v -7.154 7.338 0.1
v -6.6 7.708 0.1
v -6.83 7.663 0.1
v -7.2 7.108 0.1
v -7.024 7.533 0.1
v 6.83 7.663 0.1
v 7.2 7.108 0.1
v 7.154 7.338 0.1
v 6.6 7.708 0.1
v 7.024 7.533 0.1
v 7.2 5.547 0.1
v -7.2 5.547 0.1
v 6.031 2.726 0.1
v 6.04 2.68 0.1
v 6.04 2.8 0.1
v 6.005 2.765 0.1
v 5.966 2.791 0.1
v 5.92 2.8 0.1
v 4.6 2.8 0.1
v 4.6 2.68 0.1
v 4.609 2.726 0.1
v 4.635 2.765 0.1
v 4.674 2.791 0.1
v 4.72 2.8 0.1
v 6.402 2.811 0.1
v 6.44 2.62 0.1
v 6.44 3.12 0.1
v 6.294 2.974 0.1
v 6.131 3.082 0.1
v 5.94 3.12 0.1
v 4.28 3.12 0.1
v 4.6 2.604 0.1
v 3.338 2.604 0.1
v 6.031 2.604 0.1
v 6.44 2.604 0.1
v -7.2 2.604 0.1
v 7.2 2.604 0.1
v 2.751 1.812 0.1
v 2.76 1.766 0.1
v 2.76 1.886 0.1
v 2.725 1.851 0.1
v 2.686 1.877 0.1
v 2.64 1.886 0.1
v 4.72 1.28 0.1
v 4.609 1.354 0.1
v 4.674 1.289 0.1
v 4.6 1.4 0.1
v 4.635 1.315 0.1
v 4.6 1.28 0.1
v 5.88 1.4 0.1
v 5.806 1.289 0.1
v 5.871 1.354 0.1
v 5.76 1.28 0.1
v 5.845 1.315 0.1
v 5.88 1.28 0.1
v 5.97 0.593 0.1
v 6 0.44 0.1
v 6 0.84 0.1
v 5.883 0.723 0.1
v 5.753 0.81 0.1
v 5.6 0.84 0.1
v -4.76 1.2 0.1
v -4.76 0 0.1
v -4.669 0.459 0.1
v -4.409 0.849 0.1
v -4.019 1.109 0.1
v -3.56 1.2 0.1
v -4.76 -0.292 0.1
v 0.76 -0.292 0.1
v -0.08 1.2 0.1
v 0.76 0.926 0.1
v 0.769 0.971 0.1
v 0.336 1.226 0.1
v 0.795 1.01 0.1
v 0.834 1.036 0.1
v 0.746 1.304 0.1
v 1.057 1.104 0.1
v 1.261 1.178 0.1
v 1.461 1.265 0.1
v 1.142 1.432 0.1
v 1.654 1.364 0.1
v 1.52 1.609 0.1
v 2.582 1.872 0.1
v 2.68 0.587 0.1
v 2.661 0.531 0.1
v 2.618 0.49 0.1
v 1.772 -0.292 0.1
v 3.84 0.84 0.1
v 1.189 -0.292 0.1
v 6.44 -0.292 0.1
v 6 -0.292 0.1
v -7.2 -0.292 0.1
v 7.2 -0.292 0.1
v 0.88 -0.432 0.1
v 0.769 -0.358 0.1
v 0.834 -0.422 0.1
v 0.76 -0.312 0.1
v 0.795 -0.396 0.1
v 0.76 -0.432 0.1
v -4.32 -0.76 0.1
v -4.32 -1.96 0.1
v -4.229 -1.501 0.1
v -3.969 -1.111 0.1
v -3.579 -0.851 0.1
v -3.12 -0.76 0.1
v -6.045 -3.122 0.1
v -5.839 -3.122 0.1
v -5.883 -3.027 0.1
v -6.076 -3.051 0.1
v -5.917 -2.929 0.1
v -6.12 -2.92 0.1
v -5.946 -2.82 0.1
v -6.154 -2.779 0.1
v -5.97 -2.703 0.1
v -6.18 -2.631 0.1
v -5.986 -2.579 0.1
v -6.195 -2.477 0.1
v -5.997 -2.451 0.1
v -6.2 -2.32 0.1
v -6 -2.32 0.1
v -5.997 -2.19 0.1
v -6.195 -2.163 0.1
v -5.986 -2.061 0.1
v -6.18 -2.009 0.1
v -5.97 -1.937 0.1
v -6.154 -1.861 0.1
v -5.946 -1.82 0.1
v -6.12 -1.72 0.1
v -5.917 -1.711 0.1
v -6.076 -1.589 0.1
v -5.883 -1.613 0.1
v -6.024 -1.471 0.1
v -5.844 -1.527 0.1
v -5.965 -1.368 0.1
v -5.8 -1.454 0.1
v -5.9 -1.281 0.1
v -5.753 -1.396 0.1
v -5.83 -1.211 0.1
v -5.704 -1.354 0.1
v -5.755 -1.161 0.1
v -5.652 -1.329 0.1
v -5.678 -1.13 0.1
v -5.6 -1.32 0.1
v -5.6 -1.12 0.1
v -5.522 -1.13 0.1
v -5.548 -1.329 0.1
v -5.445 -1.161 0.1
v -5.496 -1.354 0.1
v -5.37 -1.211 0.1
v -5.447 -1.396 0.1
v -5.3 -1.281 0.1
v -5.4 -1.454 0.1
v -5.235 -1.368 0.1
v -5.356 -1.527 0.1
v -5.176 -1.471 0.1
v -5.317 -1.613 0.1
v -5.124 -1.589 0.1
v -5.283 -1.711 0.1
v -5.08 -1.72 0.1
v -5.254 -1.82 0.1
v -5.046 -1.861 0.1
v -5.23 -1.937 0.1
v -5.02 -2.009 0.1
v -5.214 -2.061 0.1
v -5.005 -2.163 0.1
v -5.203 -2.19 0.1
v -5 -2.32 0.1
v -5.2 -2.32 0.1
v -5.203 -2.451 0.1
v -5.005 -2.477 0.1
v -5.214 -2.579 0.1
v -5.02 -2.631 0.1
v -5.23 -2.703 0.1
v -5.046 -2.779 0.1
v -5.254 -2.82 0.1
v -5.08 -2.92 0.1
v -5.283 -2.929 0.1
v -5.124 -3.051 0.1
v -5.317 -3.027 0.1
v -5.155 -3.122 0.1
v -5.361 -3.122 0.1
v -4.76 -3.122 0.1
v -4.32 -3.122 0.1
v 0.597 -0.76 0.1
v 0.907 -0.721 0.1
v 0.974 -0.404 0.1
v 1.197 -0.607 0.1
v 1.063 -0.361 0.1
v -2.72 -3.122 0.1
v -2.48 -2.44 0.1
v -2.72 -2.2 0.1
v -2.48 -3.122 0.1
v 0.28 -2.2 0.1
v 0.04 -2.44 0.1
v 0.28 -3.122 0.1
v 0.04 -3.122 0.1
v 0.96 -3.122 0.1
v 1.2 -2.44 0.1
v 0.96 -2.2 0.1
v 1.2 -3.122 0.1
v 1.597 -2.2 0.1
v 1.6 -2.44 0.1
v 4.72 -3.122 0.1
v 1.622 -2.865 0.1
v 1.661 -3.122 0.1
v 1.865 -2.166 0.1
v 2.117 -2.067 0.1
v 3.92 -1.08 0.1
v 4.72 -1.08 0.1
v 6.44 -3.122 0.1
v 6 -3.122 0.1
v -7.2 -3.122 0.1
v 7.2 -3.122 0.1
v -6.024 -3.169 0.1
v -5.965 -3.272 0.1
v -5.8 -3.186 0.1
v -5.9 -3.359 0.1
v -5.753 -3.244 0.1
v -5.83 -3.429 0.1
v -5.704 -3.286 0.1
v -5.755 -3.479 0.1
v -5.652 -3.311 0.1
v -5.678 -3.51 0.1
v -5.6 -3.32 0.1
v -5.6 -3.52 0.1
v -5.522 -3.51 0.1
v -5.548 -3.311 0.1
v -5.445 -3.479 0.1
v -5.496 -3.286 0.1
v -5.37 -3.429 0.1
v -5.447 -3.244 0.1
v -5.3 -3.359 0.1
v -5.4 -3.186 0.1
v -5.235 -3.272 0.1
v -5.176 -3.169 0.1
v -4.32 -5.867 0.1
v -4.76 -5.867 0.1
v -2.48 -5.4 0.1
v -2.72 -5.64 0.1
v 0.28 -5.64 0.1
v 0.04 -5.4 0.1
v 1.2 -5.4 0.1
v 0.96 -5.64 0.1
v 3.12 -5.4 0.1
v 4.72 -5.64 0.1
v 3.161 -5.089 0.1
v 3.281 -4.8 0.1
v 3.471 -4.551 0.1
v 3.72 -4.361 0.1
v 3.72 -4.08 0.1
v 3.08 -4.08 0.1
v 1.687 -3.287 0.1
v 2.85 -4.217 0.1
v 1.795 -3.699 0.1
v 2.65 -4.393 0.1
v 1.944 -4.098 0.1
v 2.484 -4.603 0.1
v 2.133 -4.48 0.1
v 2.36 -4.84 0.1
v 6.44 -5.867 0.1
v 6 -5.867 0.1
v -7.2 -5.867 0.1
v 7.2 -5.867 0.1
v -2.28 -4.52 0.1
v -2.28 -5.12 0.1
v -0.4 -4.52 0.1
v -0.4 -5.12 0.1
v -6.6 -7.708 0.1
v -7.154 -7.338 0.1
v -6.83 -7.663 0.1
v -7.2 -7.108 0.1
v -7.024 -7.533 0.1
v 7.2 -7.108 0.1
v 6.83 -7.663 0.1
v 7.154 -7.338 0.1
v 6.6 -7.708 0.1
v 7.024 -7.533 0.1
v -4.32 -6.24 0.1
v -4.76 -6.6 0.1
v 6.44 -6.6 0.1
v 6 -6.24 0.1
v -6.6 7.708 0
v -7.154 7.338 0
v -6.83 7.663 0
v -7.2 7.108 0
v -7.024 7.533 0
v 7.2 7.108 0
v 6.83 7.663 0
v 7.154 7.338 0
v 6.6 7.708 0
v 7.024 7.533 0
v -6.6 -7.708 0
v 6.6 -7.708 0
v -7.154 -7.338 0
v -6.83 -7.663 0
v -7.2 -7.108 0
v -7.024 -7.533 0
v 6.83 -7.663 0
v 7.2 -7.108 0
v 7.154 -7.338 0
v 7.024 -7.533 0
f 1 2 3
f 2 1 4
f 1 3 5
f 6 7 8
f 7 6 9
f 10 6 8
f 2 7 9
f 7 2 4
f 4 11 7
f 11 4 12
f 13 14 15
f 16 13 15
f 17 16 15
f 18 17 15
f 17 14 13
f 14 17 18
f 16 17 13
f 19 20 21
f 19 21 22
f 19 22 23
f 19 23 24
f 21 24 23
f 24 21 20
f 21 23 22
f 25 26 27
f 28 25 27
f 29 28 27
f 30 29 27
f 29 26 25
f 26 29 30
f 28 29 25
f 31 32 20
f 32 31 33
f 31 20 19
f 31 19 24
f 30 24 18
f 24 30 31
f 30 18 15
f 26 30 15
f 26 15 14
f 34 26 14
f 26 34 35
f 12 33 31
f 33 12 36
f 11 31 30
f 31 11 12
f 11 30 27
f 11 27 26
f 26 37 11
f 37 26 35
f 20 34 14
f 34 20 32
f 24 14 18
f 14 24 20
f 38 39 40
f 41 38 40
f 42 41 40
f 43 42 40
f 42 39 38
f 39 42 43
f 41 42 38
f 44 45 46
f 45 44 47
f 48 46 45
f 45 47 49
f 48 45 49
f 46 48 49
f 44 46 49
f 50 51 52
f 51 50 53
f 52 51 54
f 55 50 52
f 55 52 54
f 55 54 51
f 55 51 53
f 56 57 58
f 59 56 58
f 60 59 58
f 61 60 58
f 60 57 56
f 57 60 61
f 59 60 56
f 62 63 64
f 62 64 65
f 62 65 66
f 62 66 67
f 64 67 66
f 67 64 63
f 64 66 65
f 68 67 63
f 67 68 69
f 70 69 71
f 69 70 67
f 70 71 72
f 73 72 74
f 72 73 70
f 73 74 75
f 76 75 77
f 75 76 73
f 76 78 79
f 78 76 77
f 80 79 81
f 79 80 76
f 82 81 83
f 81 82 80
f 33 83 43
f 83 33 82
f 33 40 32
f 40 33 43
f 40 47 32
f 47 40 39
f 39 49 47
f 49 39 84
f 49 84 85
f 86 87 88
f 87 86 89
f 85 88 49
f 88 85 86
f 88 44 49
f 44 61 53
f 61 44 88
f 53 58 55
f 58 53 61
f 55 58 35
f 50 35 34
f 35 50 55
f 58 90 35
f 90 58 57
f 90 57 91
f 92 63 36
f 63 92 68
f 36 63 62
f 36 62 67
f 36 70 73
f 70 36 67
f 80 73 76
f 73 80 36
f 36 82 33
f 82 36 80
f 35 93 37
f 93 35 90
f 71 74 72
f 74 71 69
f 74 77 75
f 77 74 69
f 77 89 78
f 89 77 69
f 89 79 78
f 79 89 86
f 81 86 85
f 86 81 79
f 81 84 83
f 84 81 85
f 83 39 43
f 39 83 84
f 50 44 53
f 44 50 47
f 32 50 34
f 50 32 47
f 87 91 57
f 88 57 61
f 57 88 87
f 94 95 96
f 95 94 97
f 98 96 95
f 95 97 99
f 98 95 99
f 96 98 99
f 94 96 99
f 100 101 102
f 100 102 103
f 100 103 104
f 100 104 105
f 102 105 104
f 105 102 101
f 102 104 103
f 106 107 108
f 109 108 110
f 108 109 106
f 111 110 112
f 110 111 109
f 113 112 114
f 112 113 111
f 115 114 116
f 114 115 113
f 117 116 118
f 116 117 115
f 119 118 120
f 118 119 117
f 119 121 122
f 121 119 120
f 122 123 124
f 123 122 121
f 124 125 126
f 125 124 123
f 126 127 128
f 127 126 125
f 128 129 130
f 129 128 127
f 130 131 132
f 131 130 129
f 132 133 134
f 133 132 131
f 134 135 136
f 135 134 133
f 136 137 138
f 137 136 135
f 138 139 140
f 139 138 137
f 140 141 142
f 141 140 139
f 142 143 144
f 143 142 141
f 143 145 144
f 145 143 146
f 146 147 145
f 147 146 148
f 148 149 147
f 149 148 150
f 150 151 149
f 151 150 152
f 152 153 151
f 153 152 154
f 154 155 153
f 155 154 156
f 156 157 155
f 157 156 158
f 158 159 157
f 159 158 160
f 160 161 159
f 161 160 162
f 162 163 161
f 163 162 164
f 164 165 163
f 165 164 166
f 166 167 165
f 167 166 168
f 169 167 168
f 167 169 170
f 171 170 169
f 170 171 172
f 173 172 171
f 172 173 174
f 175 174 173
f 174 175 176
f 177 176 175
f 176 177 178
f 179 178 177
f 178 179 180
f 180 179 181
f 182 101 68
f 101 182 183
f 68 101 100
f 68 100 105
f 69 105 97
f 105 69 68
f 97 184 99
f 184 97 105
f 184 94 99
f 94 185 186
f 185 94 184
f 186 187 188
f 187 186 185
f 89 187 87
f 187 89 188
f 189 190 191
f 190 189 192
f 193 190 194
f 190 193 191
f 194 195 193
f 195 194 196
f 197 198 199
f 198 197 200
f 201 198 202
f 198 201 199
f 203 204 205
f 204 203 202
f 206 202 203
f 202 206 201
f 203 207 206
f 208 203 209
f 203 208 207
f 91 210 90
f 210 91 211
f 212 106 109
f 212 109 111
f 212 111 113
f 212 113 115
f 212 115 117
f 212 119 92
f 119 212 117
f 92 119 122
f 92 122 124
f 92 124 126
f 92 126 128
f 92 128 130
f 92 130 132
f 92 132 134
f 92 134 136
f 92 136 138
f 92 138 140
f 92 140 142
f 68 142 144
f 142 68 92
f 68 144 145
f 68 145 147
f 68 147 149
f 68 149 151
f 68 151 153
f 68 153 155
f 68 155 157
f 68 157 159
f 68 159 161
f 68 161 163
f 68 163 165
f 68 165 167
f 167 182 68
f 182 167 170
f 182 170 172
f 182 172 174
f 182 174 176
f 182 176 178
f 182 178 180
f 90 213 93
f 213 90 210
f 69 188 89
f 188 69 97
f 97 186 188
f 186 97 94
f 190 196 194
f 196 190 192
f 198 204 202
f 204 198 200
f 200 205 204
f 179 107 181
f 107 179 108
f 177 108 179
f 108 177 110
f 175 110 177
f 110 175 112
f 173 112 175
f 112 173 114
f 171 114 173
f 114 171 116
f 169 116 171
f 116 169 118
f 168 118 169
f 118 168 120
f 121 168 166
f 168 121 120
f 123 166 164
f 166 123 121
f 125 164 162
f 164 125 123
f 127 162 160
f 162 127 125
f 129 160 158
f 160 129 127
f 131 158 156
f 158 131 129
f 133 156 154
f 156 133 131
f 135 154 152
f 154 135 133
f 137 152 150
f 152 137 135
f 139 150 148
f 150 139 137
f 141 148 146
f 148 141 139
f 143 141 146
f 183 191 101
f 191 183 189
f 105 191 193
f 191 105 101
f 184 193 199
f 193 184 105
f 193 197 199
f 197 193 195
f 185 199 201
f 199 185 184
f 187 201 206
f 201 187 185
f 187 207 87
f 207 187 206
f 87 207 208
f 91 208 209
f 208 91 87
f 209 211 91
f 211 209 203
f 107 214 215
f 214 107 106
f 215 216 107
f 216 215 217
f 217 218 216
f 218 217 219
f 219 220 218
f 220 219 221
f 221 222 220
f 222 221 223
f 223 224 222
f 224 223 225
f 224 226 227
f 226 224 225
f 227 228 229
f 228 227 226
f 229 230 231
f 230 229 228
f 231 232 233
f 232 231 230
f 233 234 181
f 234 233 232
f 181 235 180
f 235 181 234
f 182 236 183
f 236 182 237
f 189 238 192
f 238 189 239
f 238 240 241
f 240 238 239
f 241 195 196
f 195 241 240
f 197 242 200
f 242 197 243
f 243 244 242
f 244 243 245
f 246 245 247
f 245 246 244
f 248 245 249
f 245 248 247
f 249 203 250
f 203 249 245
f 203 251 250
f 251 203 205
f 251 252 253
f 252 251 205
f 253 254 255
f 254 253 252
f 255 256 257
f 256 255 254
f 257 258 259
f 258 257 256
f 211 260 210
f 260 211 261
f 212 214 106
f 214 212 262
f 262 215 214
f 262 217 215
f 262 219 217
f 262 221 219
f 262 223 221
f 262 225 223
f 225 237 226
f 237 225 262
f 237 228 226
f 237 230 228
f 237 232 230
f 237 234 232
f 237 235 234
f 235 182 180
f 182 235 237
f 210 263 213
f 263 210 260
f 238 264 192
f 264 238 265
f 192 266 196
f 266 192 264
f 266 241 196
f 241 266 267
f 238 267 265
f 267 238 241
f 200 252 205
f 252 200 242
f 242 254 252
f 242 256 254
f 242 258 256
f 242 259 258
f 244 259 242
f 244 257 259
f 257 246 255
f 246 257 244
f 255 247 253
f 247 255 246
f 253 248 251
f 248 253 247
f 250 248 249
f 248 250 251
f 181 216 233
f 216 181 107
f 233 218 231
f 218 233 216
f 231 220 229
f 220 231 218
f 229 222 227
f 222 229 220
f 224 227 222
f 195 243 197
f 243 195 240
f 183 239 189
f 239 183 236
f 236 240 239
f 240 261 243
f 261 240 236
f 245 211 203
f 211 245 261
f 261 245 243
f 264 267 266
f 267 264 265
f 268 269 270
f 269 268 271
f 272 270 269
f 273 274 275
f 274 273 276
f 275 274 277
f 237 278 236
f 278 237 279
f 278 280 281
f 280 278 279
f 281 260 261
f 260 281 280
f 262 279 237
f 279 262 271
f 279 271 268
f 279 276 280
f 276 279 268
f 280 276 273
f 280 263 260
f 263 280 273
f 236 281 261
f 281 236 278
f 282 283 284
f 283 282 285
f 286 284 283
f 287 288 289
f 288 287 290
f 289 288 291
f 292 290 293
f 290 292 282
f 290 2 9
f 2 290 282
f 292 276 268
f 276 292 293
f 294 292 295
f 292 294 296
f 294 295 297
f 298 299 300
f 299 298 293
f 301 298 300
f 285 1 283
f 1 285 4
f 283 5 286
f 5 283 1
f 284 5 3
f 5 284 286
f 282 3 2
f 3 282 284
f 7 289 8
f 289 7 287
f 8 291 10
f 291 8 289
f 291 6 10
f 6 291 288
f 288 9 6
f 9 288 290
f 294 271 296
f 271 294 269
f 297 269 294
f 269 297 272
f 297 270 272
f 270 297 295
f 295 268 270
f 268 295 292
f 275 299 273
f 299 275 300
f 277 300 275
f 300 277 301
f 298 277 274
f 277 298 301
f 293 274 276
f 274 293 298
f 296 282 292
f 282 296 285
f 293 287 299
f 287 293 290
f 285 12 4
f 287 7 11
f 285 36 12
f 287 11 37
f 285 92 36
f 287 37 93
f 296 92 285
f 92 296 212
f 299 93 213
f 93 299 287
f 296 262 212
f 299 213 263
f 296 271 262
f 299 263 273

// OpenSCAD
use <../lib.scad>
use <s/6141875rs01.scad>
use <s/6141875rs02.scad>
use <s/6141875rs03.scad>
use <s/6141875rs04.scad>
use <s/6141875rs05.scad>
use <s/6141875rs06.scad>
use <s/6141875rs07.scad>
function ldraw_lib__6141875r() = [
// 0 Sticker  1.9 x  1.8 with Taillamp on Blue Background Left (Needs Work)
// 0 Name: 6141875r.dat
// 0 Author: Massimo Maso [Sirio]
// 0 !LDRAW_ORG Part UPDATE 2023-04
// 0 !LICENSE Licensed under CC BY 4.0 : see CAreadme.txt
// 
// 0 !HELP Needs work: Some parts should be halftones.
// 0 !HELP I indicated them with dark blue color 272 instead of mix of black (0) and blue (1).
// 
// 0 BFC CERTIFY CCW
  [0,"BFC","CERTIFY"],
  [0,"BFC","CCW"],
// 
// 0 !KEYWORDS Bricklink 75875stk01, Brickowl 53567, F-150, Ford, Raptor
// 0 !KEYWORDS Rebrickable 24760, Set 75875, Speed Champions
// 
// 0 !HISTORY 2023-08-25 [OrionP] Official Update 2023-04
// 
// 
// 1 16 0 0 13.8789 1 0 0 0 1 0 0 0 1 s\6141875rs01.dat
  [1,16,0,0,13.8789,1,0,0,0,1,0,0,0,1, ldraw_lib__s__6141875rs01()],
// 1 16 0 0 13.8547 1 0 0 0 1 0 0 0 1 s\6141875rs02.dat
  [1,16,0,0,13.8547,1,0,0,0,1,0,0,0,1, ldraw_lib__s__6141875rs02()],
// 1 16 0 0 -.7172 1 0 0 0 1 0 0 0 1 s\6141875rs03.dat
  [1,16,0,0,-.7172,1,0,0,0,1,0,0,0,1, ldraw_lib__s__6141875rs03()],
// 1 16 0 0 -.7428 1 0 0 0 1 0 0 0 1 s\6141875rs04.dat
  [1,16,0,0,-.7428,1,0,0,0,1,0,0,0,1, ldraw_lib__s__6141875rs04()],
// 1 16 0 0 -14.6522 1 0 0 0 1 0 0 0 1 s\6141875rs05.dat
  [1,16,0,0,-14.6522,1,0,0,0,1,0,0,0,1, ldraw_lib__s__6141875rs05()],
// 1 16 0 0 -14.681 1 0 0 0 1 0 0 0 1 s\6141875rs06.dat
  [1,16,0,0,-14.681,1,0,0,0,1,0,0,0,1, ldraw_lib__s__6141875rs06()],
// 1 16 0 0 0 1 0 0 0 1 0 0 0 1 s\6141875rs07.dat
  [1,16,0,0,0,1,0,0,0,1,0,0,0,1, ldraw_lib__s__6141875rs07()],
];
module ldraw_lib__6141875r(step=0, col=false, unit=2/5, alt=false, line=0.2, solid=!$preview)
    makepoly(ldraw_lib__6141875r(), step=step, col=col, unit=unit, alt=alt, line=line, solid=solid);
ldraw_lib__6141875r(line=0.2);
